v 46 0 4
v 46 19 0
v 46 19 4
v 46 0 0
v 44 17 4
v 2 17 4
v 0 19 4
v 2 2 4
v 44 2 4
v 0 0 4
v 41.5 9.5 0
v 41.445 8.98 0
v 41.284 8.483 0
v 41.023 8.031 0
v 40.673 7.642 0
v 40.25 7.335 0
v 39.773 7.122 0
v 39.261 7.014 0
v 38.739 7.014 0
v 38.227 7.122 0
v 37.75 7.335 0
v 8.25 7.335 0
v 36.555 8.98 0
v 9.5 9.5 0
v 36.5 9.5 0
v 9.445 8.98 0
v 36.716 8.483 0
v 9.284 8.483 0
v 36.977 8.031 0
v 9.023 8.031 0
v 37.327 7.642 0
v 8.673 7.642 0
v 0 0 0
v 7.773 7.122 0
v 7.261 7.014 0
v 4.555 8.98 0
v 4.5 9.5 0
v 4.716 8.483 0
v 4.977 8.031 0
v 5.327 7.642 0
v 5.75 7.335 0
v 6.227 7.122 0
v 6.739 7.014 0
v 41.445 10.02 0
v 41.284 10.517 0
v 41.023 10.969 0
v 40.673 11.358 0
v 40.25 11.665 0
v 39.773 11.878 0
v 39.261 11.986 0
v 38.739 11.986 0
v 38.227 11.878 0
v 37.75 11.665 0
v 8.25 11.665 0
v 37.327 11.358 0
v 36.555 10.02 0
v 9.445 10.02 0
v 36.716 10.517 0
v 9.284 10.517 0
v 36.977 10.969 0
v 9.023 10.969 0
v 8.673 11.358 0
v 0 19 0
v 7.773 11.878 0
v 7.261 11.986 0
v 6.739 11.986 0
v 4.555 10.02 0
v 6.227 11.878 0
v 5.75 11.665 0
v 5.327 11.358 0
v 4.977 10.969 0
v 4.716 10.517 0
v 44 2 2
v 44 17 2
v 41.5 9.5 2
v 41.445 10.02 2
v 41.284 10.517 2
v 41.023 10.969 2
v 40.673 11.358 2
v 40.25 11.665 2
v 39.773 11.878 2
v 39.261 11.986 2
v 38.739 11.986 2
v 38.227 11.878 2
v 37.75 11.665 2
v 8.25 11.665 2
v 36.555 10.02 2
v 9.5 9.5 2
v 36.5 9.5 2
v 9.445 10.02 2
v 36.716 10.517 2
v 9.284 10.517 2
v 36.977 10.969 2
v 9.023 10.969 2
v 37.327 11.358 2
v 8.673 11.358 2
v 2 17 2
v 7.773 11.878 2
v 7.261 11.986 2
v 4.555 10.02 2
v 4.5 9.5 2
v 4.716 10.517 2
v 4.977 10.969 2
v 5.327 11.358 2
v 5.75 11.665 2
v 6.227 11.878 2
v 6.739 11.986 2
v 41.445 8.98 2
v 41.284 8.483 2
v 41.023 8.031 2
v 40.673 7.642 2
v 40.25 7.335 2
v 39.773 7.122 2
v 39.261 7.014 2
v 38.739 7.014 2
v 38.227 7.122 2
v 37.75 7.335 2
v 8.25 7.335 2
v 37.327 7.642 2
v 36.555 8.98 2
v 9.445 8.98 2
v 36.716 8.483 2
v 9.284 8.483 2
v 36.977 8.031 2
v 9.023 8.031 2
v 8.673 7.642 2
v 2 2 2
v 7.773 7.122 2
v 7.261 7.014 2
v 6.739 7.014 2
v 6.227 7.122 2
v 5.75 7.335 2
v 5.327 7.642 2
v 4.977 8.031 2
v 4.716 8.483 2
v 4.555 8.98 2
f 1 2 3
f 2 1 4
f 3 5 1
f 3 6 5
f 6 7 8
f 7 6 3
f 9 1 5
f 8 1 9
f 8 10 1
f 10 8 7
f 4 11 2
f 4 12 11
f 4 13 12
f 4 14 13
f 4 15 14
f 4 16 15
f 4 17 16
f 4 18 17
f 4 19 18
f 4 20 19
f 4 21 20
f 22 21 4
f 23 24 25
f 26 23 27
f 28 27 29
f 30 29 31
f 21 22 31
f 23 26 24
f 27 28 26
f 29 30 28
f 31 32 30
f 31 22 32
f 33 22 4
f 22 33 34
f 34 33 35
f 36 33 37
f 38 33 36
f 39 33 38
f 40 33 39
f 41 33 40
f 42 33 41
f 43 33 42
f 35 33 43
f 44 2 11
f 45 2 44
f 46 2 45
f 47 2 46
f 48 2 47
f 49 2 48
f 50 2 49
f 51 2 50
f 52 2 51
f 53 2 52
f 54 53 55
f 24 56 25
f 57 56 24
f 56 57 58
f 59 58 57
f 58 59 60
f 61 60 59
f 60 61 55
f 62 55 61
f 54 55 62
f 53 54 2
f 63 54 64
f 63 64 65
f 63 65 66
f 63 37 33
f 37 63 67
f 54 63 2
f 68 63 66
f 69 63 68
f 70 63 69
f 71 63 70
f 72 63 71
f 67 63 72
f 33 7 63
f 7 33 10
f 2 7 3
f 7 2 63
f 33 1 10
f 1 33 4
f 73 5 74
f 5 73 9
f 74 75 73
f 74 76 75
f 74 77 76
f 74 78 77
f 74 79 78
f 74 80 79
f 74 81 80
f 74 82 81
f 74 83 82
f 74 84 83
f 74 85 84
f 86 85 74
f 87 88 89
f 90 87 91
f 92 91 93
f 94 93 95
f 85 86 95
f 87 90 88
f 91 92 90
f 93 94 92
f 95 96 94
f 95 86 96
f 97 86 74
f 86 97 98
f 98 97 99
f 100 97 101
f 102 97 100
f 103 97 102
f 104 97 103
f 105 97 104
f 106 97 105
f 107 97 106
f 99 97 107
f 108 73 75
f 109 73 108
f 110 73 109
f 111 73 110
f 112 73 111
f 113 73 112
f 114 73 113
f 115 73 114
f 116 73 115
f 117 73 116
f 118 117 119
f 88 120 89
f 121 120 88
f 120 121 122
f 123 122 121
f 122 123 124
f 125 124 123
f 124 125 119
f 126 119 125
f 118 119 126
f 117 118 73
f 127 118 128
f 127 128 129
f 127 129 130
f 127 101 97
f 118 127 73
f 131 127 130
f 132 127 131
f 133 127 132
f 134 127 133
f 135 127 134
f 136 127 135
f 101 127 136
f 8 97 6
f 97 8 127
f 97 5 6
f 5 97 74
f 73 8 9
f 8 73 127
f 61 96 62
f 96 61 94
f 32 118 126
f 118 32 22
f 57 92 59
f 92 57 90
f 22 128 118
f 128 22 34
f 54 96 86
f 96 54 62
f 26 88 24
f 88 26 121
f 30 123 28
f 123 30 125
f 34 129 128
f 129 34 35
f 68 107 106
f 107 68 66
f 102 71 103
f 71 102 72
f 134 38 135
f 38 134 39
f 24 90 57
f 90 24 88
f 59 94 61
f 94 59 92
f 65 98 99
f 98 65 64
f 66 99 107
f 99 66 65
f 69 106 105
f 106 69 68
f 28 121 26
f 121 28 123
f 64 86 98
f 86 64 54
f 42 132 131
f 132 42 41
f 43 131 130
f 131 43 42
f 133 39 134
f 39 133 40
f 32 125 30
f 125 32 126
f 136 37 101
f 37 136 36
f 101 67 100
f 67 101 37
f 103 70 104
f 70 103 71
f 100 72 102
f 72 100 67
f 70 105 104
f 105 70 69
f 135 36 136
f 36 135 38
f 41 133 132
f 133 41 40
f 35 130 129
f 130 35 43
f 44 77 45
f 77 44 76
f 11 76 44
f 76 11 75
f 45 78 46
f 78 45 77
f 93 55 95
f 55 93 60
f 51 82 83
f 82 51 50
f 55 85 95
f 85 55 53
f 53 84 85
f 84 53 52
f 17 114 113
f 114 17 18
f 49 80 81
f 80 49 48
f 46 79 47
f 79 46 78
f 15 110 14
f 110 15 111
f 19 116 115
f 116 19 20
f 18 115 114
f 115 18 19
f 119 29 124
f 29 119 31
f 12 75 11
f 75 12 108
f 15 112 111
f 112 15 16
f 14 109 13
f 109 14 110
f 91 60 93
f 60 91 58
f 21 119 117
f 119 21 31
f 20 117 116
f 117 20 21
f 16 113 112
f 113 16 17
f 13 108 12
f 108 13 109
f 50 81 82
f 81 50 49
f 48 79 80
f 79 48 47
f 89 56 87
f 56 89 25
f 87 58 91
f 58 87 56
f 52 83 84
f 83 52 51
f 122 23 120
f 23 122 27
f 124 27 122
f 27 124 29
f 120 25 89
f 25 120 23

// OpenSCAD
inner_width = 42;
inner_depth = 15;
wall = 2;
height = 2;

$fn = 30;

difference() {
    cube([inner_width + 2 * wall, inner_depth + 2 * wall, height + wall]);
    translate([wall, wall, height]) cube([inner_width, inner_depth, wall]);
    translate([wall + 5, wall + inner_depth/2, 0]) cylinder(d = 5, h = height);
    translate([wall + inner_width - 5, wall + inner_depth/2, 0]) cylinder(d = 5, h = height);
}
